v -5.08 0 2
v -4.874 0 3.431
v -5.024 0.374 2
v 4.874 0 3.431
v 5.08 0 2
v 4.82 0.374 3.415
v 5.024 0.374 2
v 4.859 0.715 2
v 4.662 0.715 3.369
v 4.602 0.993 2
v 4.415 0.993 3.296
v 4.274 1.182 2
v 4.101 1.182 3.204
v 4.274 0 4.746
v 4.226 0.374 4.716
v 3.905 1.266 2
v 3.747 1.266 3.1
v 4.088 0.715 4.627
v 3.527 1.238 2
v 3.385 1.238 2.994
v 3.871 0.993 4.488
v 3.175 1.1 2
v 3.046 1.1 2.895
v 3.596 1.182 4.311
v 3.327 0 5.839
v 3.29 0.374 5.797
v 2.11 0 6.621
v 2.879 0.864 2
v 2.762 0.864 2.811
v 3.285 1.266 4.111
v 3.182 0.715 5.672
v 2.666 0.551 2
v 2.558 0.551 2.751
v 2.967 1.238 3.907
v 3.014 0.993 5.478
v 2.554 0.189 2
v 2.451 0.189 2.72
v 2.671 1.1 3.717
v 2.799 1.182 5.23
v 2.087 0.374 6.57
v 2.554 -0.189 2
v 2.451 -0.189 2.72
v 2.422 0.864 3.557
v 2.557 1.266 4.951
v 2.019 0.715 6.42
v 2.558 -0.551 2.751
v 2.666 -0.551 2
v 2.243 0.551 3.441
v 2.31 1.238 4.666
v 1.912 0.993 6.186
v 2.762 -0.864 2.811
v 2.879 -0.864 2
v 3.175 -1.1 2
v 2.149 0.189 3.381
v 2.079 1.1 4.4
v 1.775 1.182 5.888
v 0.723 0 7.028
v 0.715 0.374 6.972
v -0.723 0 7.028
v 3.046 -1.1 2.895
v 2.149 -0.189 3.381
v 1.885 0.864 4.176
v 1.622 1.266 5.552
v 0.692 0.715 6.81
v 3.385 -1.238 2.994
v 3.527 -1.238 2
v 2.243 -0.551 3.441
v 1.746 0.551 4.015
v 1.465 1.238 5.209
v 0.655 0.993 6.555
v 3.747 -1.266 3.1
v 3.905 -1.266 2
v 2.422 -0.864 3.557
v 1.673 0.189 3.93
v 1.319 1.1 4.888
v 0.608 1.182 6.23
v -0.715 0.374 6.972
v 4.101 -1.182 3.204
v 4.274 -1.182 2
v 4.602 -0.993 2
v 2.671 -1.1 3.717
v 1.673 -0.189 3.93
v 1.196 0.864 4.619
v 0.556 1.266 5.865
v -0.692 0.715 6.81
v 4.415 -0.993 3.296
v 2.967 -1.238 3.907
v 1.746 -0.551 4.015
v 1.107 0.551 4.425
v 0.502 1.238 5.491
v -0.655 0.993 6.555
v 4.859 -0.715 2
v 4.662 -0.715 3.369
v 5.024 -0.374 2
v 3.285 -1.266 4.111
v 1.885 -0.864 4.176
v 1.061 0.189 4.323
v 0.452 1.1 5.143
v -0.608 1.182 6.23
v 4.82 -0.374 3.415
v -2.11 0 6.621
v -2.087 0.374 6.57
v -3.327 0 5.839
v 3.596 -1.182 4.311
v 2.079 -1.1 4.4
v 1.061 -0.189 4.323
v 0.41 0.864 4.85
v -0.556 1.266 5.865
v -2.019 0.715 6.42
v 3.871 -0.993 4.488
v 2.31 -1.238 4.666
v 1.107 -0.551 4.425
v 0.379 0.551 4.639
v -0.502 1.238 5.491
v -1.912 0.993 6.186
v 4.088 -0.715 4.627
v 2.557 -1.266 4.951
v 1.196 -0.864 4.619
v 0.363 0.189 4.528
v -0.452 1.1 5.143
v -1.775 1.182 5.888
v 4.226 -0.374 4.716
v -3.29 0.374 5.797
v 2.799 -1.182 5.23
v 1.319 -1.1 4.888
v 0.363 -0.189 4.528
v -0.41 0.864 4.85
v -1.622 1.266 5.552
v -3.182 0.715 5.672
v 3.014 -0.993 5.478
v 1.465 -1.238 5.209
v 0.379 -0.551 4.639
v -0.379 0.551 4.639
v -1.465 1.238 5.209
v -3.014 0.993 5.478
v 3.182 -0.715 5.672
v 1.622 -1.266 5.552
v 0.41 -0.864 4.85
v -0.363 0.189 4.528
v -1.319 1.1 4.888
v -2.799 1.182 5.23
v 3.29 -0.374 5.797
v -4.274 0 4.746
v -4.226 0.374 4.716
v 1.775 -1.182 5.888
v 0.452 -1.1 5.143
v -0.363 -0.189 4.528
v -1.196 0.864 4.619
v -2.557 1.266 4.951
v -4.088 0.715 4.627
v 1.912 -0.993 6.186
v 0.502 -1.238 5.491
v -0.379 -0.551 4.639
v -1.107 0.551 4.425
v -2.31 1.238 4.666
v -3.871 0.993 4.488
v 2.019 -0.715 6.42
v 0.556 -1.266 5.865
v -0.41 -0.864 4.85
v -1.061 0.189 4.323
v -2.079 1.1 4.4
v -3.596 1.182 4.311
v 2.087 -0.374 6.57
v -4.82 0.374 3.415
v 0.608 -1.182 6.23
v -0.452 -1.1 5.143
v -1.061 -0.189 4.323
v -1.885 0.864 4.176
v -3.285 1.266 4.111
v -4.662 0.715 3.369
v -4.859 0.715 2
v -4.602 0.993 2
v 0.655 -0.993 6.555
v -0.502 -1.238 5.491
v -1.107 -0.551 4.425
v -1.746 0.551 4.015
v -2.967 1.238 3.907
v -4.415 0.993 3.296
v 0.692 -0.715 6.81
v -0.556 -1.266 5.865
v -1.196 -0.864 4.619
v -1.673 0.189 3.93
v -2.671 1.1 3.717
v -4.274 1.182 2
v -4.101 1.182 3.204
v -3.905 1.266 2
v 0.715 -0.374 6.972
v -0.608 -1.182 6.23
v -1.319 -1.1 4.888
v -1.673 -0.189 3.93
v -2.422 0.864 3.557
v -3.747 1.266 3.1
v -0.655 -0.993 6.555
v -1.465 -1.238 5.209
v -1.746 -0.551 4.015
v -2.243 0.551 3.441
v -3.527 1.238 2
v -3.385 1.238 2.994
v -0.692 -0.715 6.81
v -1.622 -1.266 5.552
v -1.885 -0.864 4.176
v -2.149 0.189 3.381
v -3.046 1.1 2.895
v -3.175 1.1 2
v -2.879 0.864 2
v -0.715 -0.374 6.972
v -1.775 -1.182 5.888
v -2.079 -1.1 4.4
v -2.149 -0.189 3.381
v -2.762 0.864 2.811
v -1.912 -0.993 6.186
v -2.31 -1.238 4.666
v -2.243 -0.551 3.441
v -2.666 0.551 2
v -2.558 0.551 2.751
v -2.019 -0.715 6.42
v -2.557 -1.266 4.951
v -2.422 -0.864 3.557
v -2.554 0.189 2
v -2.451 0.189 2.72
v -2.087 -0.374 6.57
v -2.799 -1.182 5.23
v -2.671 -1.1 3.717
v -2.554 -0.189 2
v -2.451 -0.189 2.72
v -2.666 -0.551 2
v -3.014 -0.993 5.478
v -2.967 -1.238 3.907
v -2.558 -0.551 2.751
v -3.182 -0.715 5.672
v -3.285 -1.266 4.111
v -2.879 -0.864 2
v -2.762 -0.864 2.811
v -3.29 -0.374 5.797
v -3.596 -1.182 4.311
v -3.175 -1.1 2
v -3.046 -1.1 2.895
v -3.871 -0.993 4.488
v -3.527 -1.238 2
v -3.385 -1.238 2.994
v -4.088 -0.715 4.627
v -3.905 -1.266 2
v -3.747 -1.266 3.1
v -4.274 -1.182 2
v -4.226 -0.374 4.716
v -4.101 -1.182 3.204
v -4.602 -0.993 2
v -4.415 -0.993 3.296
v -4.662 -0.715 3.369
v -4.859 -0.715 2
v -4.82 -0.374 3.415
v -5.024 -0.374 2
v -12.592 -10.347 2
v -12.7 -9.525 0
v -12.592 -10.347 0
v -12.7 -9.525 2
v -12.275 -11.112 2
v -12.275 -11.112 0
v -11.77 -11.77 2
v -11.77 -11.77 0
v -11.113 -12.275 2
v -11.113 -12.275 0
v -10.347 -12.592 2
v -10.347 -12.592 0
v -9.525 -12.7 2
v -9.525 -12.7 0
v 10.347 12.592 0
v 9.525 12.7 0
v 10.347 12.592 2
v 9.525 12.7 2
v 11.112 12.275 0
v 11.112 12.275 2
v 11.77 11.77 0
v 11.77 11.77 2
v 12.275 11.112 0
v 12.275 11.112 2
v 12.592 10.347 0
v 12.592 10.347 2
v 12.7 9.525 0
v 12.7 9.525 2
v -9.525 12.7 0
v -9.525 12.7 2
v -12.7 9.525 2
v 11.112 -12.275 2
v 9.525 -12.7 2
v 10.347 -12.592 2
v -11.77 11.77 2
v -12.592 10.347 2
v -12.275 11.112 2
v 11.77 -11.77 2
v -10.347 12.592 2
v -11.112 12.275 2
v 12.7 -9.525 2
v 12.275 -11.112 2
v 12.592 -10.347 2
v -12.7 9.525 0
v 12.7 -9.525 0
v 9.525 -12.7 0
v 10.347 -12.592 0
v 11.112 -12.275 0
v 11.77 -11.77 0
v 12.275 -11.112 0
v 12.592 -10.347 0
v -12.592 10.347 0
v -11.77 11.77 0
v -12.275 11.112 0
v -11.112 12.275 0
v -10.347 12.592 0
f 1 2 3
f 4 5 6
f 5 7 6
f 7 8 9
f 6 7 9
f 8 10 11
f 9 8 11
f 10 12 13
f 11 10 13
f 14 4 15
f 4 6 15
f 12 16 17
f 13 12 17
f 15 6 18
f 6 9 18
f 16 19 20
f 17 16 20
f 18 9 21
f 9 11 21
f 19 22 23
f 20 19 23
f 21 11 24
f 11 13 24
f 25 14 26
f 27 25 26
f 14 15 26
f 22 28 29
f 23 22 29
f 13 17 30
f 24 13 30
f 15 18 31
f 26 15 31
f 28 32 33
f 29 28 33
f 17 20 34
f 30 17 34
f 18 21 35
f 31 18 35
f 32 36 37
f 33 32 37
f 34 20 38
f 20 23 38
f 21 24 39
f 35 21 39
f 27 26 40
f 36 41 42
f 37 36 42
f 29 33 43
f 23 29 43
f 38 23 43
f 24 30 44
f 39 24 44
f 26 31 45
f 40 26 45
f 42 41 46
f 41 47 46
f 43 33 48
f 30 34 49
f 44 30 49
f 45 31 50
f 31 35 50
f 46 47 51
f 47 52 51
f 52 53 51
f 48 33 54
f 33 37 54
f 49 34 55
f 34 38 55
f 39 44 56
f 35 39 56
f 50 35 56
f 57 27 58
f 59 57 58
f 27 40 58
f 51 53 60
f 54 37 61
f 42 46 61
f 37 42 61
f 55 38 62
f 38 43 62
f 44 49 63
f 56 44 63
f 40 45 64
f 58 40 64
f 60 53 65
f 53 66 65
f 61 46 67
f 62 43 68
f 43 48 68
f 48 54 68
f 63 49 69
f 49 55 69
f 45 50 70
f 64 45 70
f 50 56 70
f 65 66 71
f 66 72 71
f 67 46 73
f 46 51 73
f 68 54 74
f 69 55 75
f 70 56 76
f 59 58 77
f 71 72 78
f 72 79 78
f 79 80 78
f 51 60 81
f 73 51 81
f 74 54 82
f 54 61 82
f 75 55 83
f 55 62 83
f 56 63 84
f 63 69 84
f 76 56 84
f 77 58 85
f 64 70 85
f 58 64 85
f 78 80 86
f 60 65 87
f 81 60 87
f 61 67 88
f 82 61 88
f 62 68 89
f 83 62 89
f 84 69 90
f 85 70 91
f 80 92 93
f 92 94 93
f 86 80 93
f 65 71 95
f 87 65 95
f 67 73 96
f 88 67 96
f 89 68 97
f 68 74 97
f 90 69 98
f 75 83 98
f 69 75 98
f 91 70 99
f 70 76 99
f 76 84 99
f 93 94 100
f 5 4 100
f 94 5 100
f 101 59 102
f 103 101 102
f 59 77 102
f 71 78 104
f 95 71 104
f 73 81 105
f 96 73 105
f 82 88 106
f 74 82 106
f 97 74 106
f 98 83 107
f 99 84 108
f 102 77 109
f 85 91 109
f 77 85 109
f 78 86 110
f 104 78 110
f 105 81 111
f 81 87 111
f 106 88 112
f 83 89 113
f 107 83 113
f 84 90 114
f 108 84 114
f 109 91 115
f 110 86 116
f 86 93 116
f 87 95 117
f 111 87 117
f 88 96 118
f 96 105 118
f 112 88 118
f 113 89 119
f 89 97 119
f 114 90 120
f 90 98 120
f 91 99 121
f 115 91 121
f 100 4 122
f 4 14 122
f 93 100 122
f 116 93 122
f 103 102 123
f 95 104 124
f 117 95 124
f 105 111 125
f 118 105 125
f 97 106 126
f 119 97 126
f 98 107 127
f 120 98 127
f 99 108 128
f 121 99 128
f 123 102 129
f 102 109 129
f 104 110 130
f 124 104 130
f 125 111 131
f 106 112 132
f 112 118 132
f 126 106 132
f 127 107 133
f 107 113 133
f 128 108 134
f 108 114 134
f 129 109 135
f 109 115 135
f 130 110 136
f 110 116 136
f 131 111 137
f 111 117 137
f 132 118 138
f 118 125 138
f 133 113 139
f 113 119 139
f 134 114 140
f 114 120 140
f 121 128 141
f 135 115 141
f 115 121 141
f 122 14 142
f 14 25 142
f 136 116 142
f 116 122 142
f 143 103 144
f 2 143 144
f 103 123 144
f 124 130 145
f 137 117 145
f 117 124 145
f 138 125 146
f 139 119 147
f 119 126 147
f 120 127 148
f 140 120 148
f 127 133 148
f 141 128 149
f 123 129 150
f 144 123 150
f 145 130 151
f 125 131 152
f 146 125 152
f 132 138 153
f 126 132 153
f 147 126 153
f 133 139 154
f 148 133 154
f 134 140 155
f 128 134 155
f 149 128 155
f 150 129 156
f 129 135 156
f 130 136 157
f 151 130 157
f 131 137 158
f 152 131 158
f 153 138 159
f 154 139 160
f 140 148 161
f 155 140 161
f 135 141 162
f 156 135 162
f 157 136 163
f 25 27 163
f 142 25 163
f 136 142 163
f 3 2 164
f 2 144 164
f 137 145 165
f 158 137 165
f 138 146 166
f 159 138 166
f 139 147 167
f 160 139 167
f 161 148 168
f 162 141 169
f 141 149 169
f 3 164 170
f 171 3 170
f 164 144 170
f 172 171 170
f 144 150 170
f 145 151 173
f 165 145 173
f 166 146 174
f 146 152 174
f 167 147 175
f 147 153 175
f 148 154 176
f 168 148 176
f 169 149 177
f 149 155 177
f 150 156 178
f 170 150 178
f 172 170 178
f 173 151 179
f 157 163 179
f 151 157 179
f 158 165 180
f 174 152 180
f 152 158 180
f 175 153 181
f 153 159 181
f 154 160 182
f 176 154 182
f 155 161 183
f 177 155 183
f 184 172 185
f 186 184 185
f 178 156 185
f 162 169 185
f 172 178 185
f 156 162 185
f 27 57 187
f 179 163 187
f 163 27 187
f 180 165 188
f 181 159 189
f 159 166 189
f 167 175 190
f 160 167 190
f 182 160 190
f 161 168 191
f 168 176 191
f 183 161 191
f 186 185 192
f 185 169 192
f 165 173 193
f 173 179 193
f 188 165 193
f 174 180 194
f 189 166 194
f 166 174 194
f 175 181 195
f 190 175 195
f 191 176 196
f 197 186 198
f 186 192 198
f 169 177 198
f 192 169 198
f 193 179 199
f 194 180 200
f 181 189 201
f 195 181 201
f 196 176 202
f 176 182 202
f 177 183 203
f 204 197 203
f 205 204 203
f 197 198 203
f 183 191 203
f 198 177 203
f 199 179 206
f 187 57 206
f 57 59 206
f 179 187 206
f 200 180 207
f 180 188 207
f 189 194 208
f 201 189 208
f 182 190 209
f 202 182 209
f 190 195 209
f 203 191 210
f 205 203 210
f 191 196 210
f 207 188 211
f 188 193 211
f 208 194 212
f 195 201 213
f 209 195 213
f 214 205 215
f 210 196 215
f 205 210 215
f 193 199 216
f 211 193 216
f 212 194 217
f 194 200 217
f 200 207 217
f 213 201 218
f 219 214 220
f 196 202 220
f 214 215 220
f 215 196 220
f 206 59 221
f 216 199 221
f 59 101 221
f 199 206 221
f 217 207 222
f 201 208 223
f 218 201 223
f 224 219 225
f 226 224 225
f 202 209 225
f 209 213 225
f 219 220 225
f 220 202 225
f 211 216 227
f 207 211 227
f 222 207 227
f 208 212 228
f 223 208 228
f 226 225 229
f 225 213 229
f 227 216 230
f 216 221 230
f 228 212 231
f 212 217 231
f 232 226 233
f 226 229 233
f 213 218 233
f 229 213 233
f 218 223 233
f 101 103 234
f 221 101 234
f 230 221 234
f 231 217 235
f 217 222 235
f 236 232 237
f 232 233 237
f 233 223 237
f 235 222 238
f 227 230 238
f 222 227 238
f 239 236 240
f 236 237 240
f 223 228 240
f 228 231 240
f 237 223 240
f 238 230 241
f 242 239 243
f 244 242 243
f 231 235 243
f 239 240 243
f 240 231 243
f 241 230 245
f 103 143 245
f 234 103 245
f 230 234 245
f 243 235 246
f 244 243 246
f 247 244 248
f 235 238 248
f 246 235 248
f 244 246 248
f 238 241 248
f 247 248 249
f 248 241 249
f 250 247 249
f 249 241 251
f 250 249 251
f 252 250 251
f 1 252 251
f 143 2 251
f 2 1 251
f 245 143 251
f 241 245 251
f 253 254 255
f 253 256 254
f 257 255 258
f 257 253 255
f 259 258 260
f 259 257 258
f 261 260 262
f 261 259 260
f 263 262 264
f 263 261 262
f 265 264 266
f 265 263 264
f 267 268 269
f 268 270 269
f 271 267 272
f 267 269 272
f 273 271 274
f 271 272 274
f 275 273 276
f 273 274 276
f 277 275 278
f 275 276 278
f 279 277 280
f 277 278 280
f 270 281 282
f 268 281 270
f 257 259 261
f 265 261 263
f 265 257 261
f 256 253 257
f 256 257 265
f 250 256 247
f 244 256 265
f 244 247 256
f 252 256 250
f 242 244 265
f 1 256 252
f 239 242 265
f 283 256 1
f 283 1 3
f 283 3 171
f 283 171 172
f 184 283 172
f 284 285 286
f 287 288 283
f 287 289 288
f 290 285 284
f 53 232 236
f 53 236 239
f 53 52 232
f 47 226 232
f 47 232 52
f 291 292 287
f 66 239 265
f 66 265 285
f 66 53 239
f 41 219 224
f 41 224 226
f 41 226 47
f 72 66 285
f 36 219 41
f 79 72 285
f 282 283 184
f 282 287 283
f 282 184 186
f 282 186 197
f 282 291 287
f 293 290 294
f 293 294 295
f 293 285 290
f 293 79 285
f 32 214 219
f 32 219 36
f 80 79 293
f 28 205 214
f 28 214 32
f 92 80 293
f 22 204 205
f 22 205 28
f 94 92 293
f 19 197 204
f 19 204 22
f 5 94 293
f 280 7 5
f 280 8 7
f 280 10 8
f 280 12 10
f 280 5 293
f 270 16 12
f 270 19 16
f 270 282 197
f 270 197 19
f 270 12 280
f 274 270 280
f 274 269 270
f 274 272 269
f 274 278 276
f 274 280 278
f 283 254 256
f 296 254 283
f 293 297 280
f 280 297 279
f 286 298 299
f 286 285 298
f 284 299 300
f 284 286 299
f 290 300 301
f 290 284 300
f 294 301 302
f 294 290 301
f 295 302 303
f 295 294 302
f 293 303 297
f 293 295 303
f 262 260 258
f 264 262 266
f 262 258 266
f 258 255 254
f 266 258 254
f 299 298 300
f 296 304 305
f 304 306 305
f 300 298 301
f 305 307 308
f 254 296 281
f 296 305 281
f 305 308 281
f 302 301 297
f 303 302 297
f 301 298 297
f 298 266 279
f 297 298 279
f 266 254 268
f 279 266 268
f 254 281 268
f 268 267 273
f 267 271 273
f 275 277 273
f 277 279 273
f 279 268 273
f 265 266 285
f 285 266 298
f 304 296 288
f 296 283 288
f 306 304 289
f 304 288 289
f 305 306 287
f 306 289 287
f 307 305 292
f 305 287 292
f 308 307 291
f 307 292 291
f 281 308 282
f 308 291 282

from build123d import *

# Parameters (mm, degrees)
F0_W     = 25.4
F0_H     = 25.4
F1_DEPTH = 2
F2_R     = 1.27
F3_ANGLE = 180
F4_R     = 3.175


with BuildPart() as f1:
    # F0 (on Top) → F1 (new body)
    with BuildSketch(Plane.XY):
        Rectangle(F0_W, F0_H)
    extrude(amount=F1_DEPTH)

    # F2 (on face) → F3 (revolve)
    with BuildSketch(Plane.XY.offset(2)):
        with Locations((3.81, 0)):
            Circle(F2_R)
    revolve(axis=Axis((0, 0, 2), (0, -1, 0)), revolution_arc=F3_ANGLE)

    # F4
    f4_edges = [f1.edges().sort_by_distance(p)[0] for p in [
        (12.7, -12.7, 1),
        (-12.7, -12.7, 1),
        (-12.7, 12.7, 1),
        (12.7, 12.7, 1),
    ]]
    fillet(f4_edges, radius=F4_R)


solid = f1.part
